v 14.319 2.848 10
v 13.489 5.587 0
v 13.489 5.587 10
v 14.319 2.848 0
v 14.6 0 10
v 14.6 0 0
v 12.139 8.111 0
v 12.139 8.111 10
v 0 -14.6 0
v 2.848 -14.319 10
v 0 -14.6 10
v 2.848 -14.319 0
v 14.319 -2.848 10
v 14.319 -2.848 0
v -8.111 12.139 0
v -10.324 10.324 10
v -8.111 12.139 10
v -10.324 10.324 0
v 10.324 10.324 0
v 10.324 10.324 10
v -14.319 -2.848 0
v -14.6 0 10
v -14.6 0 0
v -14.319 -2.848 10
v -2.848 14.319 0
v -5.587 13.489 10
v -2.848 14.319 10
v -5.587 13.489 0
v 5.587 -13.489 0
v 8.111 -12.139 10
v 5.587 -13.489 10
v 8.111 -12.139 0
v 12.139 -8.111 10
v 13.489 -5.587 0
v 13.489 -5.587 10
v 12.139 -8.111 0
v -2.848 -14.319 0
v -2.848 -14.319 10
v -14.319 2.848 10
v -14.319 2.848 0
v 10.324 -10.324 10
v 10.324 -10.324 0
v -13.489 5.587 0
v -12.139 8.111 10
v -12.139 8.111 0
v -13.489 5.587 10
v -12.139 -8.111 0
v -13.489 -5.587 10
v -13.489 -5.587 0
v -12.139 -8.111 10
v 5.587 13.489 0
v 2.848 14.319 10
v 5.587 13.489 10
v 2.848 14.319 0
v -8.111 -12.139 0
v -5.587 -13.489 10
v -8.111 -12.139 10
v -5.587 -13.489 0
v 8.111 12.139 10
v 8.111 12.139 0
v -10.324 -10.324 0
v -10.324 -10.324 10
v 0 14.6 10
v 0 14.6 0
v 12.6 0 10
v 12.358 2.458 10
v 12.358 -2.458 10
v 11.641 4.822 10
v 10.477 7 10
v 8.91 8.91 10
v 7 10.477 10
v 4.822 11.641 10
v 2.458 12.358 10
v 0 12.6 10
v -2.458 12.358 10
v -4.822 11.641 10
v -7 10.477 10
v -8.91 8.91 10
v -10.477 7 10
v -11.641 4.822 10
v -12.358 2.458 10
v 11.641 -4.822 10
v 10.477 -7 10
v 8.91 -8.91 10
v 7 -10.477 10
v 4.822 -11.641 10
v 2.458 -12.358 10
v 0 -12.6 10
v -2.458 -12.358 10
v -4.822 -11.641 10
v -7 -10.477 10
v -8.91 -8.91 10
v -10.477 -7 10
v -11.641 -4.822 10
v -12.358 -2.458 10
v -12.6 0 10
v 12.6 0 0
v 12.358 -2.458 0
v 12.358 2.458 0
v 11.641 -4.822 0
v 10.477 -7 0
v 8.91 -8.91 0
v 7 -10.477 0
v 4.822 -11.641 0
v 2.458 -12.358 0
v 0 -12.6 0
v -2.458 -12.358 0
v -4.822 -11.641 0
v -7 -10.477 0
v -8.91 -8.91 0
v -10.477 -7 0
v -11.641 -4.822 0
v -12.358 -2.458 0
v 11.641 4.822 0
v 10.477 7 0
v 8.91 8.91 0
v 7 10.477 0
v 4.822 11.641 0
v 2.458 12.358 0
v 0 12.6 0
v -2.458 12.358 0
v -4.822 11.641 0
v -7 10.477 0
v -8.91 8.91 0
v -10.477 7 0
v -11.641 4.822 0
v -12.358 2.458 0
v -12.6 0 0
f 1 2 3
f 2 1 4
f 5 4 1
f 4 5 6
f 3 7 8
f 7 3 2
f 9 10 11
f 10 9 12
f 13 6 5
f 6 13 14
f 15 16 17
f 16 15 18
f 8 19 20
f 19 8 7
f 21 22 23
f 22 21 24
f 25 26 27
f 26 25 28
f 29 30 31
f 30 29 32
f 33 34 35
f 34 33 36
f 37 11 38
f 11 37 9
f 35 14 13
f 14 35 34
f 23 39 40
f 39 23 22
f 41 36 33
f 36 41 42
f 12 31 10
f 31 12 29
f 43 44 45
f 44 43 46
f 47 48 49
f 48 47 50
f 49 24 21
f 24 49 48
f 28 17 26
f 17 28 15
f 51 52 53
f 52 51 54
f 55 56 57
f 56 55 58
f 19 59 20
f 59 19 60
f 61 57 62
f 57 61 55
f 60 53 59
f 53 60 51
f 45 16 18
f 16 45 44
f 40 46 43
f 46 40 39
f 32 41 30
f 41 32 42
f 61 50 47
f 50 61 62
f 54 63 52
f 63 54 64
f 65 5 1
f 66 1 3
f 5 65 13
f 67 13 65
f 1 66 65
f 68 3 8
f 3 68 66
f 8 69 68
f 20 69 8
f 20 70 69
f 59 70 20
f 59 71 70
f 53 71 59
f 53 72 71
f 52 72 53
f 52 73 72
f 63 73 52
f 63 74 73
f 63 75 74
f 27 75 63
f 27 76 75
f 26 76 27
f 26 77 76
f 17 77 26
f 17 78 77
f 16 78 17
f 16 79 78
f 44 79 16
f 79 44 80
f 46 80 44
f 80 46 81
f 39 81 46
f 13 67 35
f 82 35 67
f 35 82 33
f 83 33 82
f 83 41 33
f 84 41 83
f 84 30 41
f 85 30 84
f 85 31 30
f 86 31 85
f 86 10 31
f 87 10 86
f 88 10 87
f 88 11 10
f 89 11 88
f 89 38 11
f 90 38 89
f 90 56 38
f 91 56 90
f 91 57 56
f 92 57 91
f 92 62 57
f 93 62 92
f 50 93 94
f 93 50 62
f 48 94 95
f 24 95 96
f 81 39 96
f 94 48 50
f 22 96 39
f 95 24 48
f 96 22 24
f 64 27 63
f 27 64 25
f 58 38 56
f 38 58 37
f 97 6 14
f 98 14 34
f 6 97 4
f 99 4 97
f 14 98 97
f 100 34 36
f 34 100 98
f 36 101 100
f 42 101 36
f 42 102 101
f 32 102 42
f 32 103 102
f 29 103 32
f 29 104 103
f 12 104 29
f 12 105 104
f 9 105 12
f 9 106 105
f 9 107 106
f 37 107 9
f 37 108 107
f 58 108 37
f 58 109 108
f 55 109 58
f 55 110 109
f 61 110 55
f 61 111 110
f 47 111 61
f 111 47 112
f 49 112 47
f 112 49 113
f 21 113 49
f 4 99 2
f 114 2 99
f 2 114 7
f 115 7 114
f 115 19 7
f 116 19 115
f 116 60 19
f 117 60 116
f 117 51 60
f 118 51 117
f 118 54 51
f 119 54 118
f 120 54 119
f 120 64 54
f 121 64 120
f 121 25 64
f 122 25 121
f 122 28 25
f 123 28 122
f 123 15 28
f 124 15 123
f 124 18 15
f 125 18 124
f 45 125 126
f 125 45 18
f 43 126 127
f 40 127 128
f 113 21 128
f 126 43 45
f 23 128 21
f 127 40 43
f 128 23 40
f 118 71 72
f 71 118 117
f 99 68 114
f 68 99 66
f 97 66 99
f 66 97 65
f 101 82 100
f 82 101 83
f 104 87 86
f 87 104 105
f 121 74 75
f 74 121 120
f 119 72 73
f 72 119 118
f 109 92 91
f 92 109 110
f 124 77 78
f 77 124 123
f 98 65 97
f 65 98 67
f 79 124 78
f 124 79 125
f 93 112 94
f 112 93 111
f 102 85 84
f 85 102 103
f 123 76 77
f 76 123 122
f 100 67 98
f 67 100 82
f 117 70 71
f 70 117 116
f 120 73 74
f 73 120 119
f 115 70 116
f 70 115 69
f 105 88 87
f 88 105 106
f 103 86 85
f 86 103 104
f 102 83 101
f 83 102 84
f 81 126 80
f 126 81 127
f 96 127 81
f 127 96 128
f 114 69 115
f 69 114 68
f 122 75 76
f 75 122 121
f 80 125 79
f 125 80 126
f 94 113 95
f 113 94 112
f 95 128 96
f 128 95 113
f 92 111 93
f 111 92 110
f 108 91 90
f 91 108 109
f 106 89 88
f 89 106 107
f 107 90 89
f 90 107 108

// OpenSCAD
$fn = 32;

// ----------------------------------------------------------------------
// Spacer sleeve: 29.2 / 25.2 x 10 mm
// ----------------------------------------------------------------------

// --- parameters (mm) ---
sleeve_od = 29.2;         // outside diameter
sleeve_id = 25.2;         // shaft bore
sleeve_l = 10;            // sleeve length

module sleeve() {
  cylinder(h = sleeve_l, d = sleeve_od);
}

difference() {
  sleeve();
  translate([0, 0, -1]) cylinder(h = sleeve_l + 2, d = sleeve_id);
}
